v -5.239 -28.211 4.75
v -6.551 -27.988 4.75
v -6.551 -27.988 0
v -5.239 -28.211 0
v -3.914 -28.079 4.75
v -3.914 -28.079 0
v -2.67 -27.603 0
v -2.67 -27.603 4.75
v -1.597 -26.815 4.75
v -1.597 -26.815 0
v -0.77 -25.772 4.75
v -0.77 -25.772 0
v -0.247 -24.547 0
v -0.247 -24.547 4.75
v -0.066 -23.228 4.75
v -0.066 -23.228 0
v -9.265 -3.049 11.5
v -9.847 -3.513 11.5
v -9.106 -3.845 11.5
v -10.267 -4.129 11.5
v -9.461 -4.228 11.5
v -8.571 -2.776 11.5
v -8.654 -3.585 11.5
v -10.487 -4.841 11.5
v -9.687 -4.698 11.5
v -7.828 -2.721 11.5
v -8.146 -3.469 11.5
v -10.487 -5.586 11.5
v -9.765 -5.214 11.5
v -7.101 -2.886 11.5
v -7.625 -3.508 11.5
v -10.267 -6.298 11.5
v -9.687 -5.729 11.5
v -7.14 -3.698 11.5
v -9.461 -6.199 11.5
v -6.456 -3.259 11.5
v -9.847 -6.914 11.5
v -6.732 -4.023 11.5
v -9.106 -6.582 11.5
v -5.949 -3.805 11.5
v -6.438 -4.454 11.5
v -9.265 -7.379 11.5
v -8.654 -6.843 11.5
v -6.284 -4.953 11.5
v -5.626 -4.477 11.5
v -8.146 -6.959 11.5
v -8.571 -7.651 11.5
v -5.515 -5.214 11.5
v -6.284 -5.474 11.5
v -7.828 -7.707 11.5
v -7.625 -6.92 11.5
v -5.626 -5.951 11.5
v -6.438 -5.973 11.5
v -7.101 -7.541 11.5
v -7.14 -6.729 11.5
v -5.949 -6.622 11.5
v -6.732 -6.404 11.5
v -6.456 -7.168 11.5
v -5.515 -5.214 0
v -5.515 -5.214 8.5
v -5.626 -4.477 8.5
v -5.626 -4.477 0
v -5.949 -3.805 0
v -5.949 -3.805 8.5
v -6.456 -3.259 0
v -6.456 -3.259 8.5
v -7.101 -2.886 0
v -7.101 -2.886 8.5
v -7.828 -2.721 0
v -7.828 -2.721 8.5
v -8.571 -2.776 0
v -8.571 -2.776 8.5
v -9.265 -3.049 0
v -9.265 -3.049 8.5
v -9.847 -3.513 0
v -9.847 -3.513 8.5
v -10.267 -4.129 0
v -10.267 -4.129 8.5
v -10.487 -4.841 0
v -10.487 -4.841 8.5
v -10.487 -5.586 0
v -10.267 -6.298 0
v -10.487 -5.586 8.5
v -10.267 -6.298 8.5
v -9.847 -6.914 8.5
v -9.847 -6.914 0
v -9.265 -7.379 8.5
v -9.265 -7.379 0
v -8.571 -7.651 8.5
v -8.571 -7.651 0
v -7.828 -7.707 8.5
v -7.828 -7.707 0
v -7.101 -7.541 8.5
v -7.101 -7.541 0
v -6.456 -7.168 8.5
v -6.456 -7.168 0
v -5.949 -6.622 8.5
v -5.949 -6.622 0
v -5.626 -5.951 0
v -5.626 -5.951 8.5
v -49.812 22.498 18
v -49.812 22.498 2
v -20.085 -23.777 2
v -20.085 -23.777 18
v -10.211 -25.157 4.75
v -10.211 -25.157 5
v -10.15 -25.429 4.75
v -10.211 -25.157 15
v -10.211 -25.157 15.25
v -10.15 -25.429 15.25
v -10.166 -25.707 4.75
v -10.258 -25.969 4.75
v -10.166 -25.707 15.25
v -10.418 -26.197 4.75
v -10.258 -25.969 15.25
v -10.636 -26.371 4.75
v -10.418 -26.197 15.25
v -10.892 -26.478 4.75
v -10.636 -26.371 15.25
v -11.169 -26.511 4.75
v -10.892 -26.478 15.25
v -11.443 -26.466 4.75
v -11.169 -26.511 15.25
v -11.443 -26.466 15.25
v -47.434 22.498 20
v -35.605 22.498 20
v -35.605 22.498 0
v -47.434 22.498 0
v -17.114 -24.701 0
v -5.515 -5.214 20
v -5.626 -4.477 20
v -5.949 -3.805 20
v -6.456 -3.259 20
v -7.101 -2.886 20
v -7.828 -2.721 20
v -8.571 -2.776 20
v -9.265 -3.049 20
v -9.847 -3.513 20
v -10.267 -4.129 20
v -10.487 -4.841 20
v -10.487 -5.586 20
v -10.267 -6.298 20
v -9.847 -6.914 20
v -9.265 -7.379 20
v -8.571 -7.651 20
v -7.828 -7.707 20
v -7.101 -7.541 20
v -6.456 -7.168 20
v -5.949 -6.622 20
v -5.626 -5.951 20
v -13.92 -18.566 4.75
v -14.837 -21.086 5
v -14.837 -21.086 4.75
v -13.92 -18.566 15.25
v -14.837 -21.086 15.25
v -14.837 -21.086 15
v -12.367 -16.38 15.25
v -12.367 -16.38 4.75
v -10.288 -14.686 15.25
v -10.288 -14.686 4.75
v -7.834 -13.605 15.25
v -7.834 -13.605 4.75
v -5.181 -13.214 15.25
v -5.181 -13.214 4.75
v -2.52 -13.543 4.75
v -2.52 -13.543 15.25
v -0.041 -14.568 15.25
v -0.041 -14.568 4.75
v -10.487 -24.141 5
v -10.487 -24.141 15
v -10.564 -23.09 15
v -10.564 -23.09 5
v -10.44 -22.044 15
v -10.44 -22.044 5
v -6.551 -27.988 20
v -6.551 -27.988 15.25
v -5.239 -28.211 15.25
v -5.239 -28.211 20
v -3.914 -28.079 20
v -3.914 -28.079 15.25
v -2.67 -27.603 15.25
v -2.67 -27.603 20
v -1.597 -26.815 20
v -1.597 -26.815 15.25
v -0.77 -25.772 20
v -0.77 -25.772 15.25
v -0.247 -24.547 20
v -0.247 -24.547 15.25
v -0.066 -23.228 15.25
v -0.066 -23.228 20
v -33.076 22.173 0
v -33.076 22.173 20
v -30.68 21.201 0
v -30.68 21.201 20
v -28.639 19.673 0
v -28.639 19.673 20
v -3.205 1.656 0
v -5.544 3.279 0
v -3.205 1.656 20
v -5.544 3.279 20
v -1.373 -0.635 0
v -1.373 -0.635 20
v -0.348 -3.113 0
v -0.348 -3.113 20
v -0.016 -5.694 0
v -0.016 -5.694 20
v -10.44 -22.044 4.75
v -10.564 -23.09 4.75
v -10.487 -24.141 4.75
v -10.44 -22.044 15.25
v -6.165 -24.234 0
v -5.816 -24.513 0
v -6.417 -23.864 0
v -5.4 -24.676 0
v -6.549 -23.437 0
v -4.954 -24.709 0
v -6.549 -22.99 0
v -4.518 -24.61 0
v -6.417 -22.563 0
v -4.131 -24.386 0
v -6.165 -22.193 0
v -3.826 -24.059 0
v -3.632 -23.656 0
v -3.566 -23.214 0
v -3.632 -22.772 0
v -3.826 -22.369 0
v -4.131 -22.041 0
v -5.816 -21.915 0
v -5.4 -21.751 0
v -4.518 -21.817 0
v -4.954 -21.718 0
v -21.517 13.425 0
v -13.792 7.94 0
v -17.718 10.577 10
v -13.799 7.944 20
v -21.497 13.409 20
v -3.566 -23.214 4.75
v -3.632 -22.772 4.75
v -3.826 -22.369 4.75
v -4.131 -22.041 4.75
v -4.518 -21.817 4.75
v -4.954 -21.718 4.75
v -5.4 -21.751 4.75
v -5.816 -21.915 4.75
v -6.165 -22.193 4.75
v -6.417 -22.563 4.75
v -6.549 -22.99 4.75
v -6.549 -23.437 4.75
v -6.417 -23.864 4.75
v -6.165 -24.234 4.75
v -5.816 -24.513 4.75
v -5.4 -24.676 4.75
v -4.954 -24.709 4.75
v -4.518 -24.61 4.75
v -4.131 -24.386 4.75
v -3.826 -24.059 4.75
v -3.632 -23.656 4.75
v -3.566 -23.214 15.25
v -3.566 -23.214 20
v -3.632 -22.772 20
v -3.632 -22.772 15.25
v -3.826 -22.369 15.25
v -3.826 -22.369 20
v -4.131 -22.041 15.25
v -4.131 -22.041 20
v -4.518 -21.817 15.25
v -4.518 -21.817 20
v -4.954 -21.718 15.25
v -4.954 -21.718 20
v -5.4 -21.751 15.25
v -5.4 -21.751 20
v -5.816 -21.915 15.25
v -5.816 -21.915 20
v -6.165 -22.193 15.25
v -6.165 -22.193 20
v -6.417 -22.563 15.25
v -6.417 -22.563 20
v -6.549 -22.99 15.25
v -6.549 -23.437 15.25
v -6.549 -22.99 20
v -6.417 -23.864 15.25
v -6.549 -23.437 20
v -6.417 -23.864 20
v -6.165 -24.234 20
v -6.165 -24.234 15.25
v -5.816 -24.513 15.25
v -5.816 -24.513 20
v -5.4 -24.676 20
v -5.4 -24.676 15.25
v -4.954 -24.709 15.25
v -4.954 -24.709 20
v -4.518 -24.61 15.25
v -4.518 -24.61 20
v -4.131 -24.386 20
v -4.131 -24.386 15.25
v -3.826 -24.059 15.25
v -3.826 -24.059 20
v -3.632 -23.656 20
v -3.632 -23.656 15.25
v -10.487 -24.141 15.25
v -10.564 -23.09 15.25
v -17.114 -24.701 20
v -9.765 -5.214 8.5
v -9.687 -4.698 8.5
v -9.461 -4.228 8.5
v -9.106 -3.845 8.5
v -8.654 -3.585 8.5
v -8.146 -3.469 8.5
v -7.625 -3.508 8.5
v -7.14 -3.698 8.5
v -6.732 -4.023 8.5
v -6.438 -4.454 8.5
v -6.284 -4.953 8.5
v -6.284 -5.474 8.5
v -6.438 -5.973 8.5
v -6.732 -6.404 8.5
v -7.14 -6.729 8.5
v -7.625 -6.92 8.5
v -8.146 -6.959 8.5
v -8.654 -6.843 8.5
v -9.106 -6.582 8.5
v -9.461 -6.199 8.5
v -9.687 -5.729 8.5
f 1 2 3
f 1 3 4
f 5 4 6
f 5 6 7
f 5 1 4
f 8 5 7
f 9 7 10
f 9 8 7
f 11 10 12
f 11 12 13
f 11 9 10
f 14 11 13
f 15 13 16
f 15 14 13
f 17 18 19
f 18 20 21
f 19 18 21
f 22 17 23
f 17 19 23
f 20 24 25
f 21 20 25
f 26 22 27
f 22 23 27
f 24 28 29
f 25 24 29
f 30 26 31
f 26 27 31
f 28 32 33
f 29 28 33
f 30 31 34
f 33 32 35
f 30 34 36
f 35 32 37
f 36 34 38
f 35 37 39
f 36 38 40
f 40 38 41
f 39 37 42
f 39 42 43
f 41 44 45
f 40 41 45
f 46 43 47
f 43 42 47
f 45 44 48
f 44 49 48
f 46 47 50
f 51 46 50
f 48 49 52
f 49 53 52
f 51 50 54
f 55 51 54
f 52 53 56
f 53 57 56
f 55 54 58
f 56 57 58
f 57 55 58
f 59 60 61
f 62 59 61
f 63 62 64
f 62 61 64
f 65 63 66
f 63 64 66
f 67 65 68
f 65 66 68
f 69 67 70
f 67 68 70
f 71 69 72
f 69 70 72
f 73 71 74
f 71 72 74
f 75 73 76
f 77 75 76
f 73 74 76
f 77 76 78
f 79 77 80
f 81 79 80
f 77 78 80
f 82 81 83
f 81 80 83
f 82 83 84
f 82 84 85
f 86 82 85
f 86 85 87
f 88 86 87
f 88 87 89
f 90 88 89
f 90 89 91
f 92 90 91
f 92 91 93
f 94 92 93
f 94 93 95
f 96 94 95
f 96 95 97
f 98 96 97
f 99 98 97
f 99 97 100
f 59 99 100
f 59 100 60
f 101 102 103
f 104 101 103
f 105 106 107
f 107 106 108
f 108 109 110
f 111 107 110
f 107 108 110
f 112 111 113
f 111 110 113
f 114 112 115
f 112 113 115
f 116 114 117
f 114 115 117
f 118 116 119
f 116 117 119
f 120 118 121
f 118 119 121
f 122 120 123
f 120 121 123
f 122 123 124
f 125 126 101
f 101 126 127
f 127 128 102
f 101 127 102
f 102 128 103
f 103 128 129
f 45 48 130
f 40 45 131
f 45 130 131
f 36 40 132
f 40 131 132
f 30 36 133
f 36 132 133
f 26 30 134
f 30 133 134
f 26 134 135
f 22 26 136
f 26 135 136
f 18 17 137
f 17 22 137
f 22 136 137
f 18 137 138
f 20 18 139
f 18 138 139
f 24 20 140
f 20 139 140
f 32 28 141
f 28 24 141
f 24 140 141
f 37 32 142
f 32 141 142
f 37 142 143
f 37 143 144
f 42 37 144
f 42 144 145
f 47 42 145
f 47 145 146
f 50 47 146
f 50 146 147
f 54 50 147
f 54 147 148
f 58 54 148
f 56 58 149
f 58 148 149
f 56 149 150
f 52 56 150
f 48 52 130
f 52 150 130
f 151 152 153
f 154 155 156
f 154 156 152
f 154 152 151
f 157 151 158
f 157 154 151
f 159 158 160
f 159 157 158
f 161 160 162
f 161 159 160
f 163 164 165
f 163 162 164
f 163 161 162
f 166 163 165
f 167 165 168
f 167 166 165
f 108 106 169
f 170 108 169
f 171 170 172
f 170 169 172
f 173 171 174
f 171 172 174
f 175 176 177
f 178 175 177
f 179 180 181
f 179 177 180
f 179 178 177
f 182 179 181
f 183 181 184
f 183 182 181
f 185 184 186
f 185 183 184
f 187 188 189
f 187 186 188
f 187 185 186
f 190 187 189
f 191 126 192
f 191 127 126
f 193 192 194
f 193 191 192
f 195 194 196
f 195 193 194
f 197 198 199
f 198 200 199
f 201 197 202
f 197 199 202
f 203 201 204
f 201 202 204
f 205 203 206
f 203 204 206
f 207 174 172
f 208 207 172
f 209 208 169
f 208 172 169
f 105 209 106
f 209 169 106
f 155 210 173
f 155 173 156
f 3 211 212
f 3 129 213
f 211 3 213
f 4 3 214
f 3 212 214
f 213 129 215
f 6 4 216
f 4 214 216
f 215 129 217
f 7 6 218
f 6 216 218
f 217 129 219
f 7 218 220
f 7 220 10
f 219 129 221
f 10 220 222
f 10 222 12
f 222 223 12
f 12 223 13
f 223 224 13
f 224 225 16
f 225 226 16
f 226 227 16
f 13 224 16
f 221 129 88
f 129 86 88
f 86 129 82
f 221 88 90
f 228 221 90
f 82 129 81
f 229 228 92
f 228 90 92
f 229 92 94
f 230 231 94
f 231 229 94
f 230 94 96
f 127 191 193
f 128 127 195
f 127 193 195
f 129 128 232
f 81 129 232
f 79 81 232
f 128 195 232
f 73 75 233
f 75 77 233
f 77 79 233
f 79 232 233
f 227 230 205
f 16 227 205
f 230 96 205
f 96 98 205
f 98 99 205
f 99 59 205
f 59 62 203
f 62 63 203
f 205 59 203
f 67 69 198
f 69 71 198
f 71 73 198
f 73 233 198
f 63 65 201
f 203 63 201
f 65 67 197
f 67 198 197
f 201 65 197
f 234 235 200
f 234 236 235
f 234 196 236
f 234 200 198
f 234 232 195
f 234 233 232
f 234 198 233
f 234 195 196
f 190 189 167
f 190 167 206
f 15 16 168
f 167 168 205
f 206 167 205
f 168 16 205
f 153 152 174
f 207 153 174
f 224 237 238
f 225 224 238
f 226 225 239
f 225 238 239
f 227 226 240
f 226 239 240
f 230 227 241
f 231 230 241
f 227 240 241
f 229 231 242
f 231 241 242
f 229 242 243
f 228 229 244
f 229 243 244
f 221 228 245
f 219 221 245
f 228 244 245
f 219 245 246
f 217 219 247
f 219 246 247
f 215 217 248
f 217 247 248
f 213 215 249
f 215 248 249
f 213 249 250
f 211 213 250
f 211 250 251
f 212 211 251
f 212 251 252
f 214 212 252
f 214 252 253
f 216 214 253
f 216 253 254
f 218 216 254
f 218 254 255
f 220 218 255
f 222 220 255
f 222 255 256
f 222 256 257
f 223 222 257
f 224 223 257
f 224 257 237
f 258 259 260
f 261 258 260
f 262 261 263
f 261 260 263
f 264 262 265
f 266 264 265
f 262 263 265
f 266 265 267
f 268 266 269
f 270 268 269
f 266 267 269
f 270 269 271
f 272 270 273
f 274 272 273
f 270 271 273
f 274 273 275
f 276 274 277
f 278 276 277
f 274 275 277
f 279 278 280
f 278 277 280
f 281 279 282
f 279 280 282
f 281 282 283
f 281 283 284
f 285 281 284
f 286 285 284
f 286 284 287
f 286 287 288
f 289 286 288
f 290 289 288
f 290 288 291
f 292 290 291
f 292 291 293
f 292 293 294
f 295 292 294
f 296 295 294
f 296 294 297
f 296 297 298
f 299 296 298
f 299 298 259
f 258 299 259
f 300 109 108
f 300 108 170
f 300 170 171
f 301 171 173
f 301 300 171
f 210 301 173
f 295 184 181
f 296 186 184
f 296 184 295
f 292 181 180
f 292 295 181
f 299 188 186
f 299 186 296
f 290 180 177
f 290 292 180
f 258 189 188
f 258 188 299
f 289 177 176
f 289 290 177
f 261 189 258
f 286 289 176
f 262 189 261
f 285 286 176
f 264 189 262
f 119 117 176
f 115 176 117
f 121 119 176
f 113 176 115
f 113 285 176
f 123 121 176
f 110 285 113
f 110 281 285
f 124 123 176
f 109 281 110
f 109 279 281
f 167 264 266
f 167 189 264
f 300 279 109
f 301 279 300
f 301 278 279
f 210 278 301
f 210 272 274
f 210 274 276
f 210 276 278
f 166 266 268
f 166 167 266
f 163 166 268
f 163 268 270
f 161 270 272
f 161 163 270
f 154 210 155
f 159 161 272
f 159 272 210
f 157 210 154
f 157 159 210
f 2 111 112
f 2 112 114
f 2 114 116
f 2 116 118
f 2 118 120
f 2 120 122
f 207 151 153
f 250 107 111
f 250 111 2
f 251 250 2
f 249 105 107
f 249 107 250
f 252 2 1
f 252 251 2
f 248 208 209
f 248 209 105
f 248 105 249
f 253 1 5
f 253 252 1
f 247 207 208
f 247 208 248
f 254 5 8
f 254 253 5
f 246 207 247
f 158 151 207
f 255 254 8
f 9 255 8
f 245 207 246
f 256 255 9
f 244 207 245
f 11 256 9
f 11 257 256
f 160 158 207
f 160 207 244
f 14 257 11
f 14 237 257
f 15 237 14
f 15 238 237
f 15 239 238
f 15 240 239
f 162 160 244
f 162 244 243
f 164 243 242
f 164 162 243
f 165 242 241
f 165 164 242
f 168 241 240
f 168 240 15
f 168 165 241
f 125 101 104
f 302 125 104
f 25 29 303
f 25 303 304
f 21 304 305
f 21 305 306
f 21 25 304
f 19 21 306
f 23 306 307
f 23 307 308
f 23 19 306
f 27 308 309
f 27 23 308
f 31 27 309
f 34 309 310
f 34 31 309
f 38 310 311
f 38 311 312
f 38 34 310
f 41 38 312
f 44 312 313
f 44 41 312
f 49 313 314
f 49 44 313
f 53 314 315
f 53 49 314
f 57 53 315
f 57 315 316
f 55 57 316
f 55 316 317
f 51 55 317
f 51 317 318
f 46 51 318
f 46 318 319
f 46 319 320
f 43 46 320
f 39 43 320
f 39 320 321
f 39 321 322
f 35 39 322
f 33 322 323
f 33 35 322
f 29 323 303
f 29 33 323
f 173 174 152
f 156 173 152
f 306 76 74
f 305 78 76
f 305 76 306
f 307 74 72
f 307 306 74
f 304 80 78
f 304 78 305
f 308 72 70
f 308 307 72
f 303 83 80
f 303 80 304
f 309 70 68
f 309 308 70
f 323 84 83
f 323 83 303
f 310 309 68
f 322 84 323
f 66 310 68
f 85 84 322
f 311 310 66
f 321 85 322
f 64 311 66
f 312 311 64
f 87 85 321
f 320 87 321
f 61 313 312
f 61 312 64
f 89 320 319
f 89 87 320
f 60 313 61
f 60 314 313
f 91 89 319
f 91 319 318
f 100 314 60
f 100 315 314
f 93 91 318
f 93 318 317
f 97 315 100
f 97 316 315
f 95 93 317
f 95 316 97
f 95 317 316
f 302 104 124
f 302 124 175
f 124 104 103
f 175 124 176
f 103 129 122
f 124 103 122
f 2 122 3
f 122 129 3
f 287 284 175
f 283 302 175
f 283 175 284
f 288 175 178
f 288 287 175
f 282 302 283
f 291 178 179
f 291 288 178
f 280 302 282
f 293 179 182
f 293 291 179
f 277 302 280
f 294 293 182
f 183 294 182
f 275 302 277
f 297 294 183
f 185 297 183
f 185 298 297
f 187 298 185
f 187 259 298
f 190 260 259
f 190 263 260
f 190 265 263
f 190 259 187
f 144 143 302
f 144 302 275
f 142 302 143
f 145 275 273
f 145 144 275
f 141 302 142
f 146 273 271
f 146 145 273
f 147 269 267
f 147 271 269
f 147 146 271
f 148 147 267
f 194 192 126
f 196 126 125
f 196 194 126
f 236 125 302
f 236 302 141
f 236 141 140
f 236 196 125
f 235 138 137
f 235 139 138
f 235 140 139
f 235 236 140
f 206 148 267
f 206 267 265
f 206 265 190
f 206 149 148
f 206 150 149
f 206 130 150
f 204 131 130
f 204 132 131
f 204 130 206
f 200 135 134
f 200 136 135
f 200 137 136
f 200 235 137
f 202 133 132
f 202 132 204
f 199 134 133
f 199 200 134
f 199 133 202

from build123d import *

# Parameters (mm, degrees)
EXTRUDE_1_DEPTH       = 20
FILLET_1_R            = 5
SKETCH_2_R            = 1.5000000000000024
CUT_EXTRUDE_1_DEPTH   = 24
CUT_EXTRUDE_START     = -5
SKETCH_3_R            = 7.5
CUT_EXTRUDE_2_DEPTH   = 10
CHAMFER_1_SIZE        = 2
FILLET_4_R            = 5
SKETCH_5_R            = 2.5000000000000018
CUT_EXTRUDE_3_DEPTH   = 25
EXTRUDE_START         = -11.5
SKETCH_6_R            = 2.5000000000000004
SKETCH_6_R_2          = 1.7499999999999998
EXTRUDE_2_DEPTH       = 3
CUT_EXTRUDE_4_DEPTH   = 34
FILLET_5_R            = 10
FILLET_6_R            = 10
CHAMFER_START         = 15.398006277
CHAMFER_2_OUTLINE_W   = 6.958890637
CHAMFER_2_OUTLINE_H   = 10.000000000000002
CHAMFER_2_DEPTH       = 3.601993723
CHAMFER_START_2       = 14
CHAMFER_2_2_OUTLINE_W = 6.958890637
CHAMFER_2_2_OUTLINE_H = 10.000000000000002
CHAMFER_2_2_DEPTH     = 1.398006277
SKETCH_9_R            = 10.000000000005517
CUT_EXTRUDE_5_DEPTH   = 10
EXTRUDE_4_DEPTH       = 10
FILLET_7_R            = 1
FILLET_8_R            = 10
CUT_EXTRUDE_START_2   = -0.25
CUT_EXTRUDE_6_DEPTH   = 0.25
CUT_EXTRUDE_7_DEPTH   = 0.25


with BuildPart() as part:
    # 草图1 → 凸台-拉伸1 (new body)
    with BuildSketch(Plane.XY):
        Polygon((0, 0), (-26.811555509164208, 22.497566339028918), (-49.8115555091642, 22.49756633902892), (-20.084941781424334, -23.776923785463527), (-0.08494178142433392, -29.999879747988462), align=None)
    extrude(amount=EXTRUDE_1_DEPTH)

    # 圆角1
    fillet_1_edges = [part.edges().sort_by_distance(p)[0] for p in [
        (-0.08494178142433392, -29.999879747988462, 10),
    ]]
    fillet(fillet_1_edges, radius=FILLET_1_R)

    # 草图2 → 切除-拉伸1 (cut)
    with BuildSketch(Plane.XY.offset(20)):
        with Locations((-5.0657473249540095, -23.213671166892293)):
            Circle(SKETCH_2_R)
    extrude(amount=-CUT_EXTRUDE_1_DEPTH, mode=Mode.SUBTRACT)

    # 草图3 → 切除-拉伸2 (cut)
    with BuildSketch(Plane.XY.offset(20).offset(CUT_EXTRUDE_START)):
        with Locations((-5.0657473249540095, -23.213671166892293)):
            Circle(SKETCH_3_R)
    extrude(amount=-CUT_EXTRUDE_2_DEPTH, mode=Mode.SUBTRACT)

    # 倒角1
    chamfer_1_edges = [part.edges().sort_by_distance(p)[0] for p in [
        (-34.94824864529427, -0.6396787232173011, 20),
        (-34.94824864529427, -0.6396787232173011, 0),
    ]]
    chamfer(chamfer_1_edges, length=CHAMFER_1_SIZE)

    # 圆角4
    fillet_4_edges = [part.edges().sort_by_distance(p)[0] for p in [
        (0, 0, 10),
    ]]
    fillet(fillet_4_edges, radius=FILLET_4_R)

    # 草图5 → 切除-拉伸3 (cut)
    with BuildSketch(Plane.XY.offset(20)):
        with Locations((-8.014794077059545, -5.213671166892294)):
            Circle(SKETCH_5_R)
    extrude(amount=-CUT_EXTRUDE_3_DEPTH, mode=Mode.SUBTRACT)

    # 草图6 → 凸台-拉伸2 (add)
    with BuildSketch(Plane(origin=(0, 0, 0), x_dir=(-1, 0, 0), z_dir=(0, 0, -1)).offset(EXTRUDE_START)):
        with Locations(Location((8.014794077059545, -5.213671166892294, 0), (0, 0, 180))):
            Circle(SKETCH_6_R)
        with Locations((8.014794077059545, -5.213671166892294)):
            Circle(SKETCH_6_R_2, mode=Mode.SUBTRACT)
    extrude(amount=EXTRUDE_2_DEPTH)

    # 草图7 → 切除-拉伸4 (cut)
    with BuildSketch(Plane.XY.offset(20)):
        with BuildLine():
            Line((-31.431124160284014, 22.497566339028918), (-26.811555509164208, 22.497566339028918))
            Line((-26.811555509164208, 22.497566339028918), (-1.7926678262045348, 1.5042269117916054))
            add(Edge.make_bspline(
                [(-1.7926678262045348, 1.5042269117916054), (-18.67112927693908, 9.044601568140122), (-31.431124160284014, 22.497566339028918)],
                knots=[0, 0, 0, 1, 1, 1], degree=2))
        make_face()
    extrude(amount=-CUT_EXTRUDE_4_DEPTH, mode=Mode.SUBTRACT)

    # 圆角5
    fillet_5_edges = [part.edges().sort_by_distance(p)[0] for p in [
        (-1.792667826204533, 1.504226911791605, 10),
    ]]
    fillet(fillet_5_edges, radius=FILLET_5_R)

    # 圆角6
    # the kernel refuses this fillet: 10 mm, written as the material it takes off along each edge
    with BuildSketch(Plane(origin=(-11.888995884089002, -26.327074304981263, 5), x_dir=(-0.9548468391902787, 0.29709849156186213, 0), z_dir=(0, 0, 1))) as fillet_6_piece_1:
        with BuildLine():
            CenterArc((11.180339887498954, -9.999999999999998), FILLET_6_R, 90.00000000000001, 73.39845040097977)
            ThreePointArc((1.597191412499857, -7.142857142857143), (1.7290806033645267, -3.3633658232300525), (0, 0))
            Line((0, 0), (11.180339887498953, -2e-17))
        make_face()
    extrude(amount=10, mode=Mode.SUBTRACT)

    # 倒角2: read off the stored shape, not the designer's step
    # 倒角2 outline → 倒角2 (cut)
    with BuildSketch(Plane(origin=(0, 0, 0), x_dir=(0.9972181140668777, 0.0745388018209292, 0), z_dir=(0.07453880182092919, -0.9972181140668778, 0)).offset(CHAMFER_START)):
        with Locations((-4.674246913499999, 10)):
            Rectangle(CHAMFER_2_OUTLINE_W, CHAMFER_2_OUTLINE_H)
    extrude(amount=CHAMFER_2_DEPTH, mode=Mode.SUBTRACT)

    # Chamfer 2 2 outline → Chamfer 2 2 (add)
    with BuildSketch(Plane(origin=(0, 0, 0), x_dir=(0.9972181140668777, 0.0745388018209292, 0), z_dir=(0.07453880182092919, -0.9972181140668778, 0)).offset(CHAMFER_START_2)):
        with Locations((-4.674246913499999, 10)):
            Rectangle(CHAMFER_2_2_OUTLINE_W, CHAMFER_2_2_OUTLINE_H)
    extrude(amount=CHAMFER_2_2_DEPTH)

    # 草图9 → 切除-拉伸5 (cut)
    with BuildSketch(Plane.XY.offset(4.999999999999999)):
        with Locations((-5.065747324960373, -23.21367116689012)):
            Circle(SKETCH_9_R)
    extrude(amount=CUT_EXTRUDE_5_DEPTH, mode=Mode.SUBTRACT)

    # 草图10 → 凸台-拉伸4 (add)
    with BuildSketch(Plane.XY.offset(4.999999999999999)):
        with BuildLine():
            Line((-20.306861182467813, -23.431468792638793), (-20.084941781424334, -23.776923785463527))
            Line((-20.084941781424334, -23.776923785463527), (-8.739068741608744, -27.30716719962209))
            ThreePointArc((-8.739068741608744, -27.30716719962209), (-10.29932188852527, -24.904735118255193), (-10.439836916118015, -22.04355960545204))
            Line((-10.439836916118015, -22.04355960545204), (-14.836819308888755, -21.086195600637897))
            ThreePointArc((-14.836819308888755, -21.086195600637897), (-14.95313679387356, -21.717165406749196), (-15.028752577744056, -22.354295618532444))
            ThreePointArc((-15.028752577744056, -22.354295618532444), (-17.59390852193624, -23.254981419998394), (-20.306861182467813, -23.431468792638793))
        make_face()
    extrude(amount=EXTRUDE_4_DEPTH)

    # 圆角7
    fillet_7_edges = [part.edges().sort_by_distance(p)[0] for p in [
        (-8.739068741608744, -27.30716719962209, 10),
    ]]
    fillet(fillet_7_edges, radius=FILLET_7_R)

    # 圆角8
    fillet_8_edges = [part.edges().sort_by_distance(p)[0] for p in [
        (-31.431124160284014, 22.497566339028918, 10),
    ]]
    fillet(fillet_8_edges, radius=FILLET_8_R)

    # 草图11 → 切除-拉伸6 (cut)
    with BuildSketch(Plane(origin=(0, 0, 15), x_dir=(-1, 0, 0), z_dir=(0, 0, -1)).offset(CUT_EXTRUDE_START_2)):
        with BuildLine():
            Line((6.551239782763319, -27.987905362843687), (11.44337405787706, -26.4657285550041))
            ThreePointArc((11.44337405787706, -26.4657285550041), (10.418424754087408, -26.19661722979815), (10.210809683029842, -25.157464708287105))
            ThreePointArc((10.210809683029842, -25.157464708287105), (10.550931066650136, -23.617105572837715), (10.439836916118015, -22.04355960545204))
            Line((10.439836916118015, -22.04355960545204), (14.836819308888755, -21.086195600637897))
            ThreePointArc((14.836819308888755, -21.086195600637897), (9.097555674937517, -14.06246788922412), (0.04124678677052372, -14.567608806379399))
            Line((0.04124678677052372, -14.567608806379399), (0.06576736695593181, -23.227828130463013))
            ThreePointArc((0.06576736695593181, -23.227828130463013), (2.1072866759334765, -27.24449125568279), (6.551239782763319, -27.987905362843687))
        make_face()
    extrude(amount=CUT_EXTRUDE_6_DEPTH, mode=Mode.SUBTRACT)

    # 草图12 → 切除-拉伸7 (cut)
    with BuildSketch(Plane.XY.offset(4.999999999999999)):
        with BuildLine():
            Line((-14.836819308888755, -21.086195600637897), (-10.439836916118015, -22.04355960545204))
            ThreePointArc((-10.439836916118015, -22.04355960545204), (-10.550931066650133, -23.617105572837712), (-10.21080968302984, -25.157464708287105))
            ThreePointArc((-10.21080968302984, -25.157464708287105), (-10.418424754087408, -26.19661722979815), (-11.44337405787706, -26.465728555004105))
            Line((-11.44337405787706, -26.465728555004105), (-6.551239782763319, -27.987905362843687))
            ThreePointArc((-6.551239782763319, -27.987905362843687), (-2.107286675933478, -27.24449125568279), (-0.06576736695593308, -23.227828130463013))
            Line((-0.06576736695593308, -23.227828130463013), (-0.04124678677052488, -14.567608806379397))
            ThreePointArc((-0.04124678677052488, -14.567608806379397), (-9.097555674937517, -14.062467889224122), (-14.836819308888755, -21.086195600637897))
        make_face()
    extrude(amount=-CUT_EXTRUDE_7_DEPTH, mode=Mode.SUBTRACT)


solid = part.part
